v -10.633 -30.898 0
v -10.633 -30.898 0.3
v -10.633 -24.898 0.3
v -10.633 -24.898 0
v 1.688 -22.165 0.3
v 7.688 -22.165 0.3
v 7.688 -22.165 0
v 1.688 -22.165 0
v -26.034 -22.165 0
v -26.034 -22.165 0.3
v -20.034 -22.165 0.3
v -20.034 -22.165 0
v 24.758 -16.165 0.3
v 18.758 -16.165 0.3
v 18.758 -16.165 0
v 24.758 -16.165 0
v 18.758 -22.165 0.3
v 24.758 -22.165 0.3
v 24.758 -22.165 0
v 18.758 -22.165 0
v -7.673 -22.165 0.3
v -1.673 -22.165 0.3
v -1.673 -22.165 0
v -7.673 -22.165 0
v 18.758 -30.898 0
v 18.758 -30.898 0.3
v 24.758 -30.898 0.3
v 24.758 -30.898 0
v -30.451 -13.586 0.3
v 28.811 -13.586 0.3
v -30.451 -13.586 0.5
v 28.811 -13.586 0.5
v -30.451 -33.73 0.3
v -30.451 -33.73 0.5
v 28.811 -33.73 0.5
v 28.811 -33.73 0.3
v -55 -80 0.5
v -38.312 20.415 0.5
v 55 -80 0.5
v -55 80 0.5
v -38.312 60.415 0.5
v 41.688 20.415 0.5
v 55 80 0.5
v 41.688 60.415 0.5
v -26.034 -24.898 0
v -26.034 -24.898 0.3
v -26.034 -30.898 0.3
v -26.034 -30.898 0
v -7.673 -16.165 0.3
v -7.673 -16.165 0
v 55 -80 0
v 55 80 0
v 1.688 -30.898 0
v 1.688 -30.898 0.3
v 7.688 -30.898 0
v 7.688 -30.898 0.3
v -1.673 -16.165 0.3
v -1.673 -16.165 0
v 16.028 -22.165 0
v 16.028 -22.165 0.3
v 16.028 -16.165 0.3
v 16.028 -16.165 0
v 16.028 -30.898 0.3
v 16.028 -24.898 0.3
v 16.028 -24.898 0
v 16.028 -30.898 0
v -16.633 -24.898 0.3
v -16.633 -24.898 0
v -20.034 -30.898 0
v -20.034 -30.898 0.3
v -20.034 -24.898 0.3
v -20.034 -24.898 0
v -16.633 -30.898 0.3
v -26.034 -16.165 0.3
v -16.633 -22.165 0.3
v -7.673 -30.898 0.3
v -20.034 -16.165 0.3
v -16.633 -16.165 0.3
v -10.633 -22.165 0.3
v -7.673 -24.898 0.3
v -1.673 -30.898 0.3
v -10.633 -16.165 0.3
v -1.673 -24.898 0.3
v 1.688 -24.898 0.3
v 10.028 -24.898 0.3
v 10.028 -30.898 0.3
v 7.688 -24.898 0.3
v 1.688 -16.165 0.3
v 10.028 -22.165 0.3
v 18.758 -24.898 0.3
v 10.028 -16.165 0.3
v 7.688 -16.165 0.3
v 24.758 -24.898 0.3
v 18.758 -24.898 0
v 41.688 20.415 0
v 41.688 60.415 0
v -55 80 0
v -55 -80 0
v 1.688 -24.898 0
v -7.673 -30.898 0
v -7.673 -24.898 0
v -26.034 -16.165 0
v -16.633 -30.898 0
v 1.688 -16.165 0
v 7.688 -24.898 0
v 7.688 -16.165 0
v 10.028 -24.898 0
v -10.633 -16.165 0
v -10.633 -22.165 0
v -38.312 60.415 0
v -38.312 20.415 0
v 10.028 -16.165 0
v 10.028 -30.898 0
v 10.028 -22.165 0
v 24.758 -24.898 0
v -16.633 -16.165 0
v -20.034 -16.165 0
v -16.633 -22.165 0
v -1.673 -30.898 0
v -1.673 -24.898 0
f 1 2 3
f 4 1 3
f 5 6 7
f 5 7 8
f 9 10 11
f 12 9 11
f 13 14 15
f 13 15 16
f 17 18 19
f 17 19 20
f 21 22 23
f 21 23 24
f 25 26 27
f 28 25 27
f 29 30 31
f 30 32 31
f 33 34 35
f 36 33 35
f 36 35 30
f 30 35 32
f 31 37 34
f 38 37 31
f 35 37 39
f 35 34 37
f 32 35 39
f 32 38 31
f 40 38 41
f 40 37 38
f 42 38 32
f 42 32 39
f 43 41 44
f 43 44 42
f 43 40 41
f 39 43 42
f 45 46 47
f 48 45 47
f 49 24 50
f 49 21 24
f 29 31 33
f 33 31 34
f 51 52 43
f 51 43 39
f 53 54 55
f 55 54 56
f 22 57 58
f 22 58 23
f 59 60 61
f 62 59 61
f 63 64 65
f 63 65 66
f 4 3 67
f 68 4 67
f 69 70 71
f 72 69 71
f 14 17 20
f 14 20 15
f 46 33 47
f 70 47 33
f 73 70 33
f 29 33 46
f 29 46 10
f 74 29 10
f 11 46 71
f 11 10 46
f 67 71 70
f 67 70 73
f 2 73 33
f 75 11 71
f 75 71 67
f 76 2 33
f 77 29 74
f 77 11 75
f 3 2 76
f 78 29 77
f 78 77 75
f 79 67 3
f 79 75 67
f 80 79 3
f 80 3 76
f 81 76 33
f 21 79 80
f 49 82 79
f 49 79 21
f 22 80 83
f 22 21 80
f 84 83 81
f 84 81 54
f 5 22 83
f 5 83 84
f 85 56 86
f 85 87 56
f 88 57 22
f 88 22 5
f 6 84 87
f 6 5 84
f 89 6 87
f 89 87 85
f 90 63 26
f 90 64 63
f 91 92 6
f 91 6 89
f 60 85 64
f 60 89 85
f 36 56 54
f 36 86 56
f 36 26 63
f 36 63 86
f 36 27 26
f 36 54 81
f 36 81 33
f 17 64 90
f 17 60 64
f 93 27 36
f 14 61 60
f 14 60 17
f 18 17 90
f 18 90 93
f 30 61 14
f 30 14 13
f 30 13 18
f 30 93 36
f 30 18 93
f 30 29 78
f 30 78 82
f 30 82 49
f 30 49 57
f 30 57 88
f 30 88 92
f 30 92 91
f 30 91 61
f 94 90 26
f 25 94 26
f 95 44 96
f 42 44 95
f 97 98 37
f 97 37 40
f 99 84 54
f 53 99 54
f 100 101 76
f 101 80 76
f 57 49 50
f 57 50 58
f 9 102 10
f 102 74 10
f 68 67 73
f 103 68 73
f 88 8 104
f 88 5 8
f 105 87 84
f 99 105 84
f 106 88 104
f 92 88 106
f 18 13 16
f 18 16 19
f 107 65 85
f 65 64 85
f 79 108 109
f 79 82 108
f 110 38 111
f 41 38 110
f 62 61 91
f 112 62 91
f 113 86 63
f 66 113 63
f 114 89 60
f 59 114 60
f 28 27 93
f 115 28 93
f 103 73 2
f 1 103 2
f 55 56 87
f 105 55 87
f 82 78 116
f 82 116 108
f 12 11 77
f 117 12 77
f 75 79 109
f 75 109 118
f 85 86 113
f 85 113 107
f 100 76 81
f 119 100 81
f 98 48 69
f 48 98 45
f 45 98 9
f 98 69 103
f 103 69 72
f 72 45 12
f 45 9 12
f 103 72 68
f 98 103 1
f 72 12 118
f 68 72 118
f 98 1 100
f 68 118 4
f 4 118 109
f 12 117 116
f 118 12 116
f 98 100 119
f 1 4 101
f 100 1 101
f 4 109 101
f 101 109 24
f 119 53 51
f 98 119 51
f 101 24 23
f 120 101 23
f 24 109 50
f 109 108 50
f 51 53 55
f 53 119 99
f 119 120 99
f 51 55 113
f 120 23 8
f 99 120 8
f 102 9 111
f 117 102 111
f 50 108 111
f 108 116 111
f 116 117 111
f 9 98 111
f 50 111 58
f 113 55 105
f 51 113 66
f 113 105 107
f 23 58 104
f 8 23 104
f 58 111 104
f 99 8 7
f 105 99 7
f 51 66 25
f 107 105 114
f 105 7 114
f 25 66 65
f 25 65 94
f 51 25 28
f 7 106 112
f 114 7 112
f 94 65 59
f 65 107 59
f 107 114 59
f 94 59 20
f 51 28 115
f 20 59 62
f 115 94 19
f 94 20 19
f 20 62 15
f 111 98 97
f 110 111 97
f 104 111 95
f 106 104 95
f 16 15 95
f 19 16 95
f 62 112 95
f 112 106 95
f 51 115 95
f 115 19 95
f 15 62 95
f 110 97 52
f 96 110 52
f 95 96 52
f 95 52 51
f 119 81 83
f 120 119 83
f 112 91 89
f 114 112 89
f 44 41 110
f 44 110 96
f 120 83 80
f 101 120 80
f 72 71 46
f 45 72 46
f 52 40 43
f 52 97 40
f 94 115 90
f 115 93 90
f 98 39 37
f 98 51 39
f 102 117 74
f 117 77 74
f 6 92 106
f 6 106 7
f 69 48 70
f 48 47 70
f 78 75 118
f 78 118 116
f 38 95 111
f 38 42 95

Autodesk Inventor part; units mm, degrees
ref_plane "YZ Plane" through (0, 0, 0) normal (1, 0, 0) x (0, 1, 0)
ref_plane "XZ Plane" through (0, 0, 0) normal (0, 1, 0) x (-1, 0, 0)
ref_plane "XY Plane" through (0, 0, 0) normal (0, 0, 1) x (1, 0, 0)
sketch "Boceto1" plane through (0, 0, 0) normal (0, 0, 1) x (1, 0, 0)
  line L0 (-55, 80) -> (55, 80)
  line L1 (55, 80) -> (55, -80)
  line L2 (55, -80) -> (-55, -80)
  line L3 (-55, -80) -> (-55, 80)
  line L4 (-55, 80) -> (55, -80) construction
  line L5 (55, 80) -> (-55, -80) construction
  point P0 (0, 0)
  dimension "d0" = 110
  dimension "d1" = 160
extrude "Placa1" add sketch "Boceto1" along normal blind 0.5
sketch "Boceto2" plane through (0, 0, 0.5) normal (0, 0, 1) x (1, 0, 0)
  line L0 (-38.3122, 60.4154) -> (41.6878, 60.4154)
  line L1 (41.6878, 60.4154) -> (41.6878, 20.4154)
  line L2 (41.6878, 20.4154) -> (-38.3122, 20.4154)
  line L3 (-38.3122, 20.4154) -> (-38.3122, 60.4154)
  line L4 (-26.0335, -16.1653) -> (-26.0335, -22.1653)
  line L5 (-26.0335, -22.1653) -> (-20.0335, -22.1653)
  line L6 (-20.0335, -22.1653) -> (-20.0335, -16.1653)
  line L7 (-20.0335, -16.1653) -> (-26.0335, -16.1653)
  line L8 (-16.6334, -22.1653) -> (-16.6334, -16.1653)
  line L9 (-16.6334, -16.1653) -> (-10.6334, -16.1653)
  line L10 (-10.6334, -16.1653) -> (-10.6334, -22.1653)
  line L11 (-10.6334, -22.1653) -> (-16.6334, -22.1653)
  line L12 (-7.6728, -22.1653) -> (-7.6728, -16.1653)
  line L13 (-7.6728, -16.1653) -> (-1.6728, -16.1653)
  line L14 (-1.6728, -16.1653) -> (-1.6728, -22.1653)
  line L15 (-1.6728, -22.1653) -> (-7.6728, -22.1653)
  line L16 (1.6878, -22.1653) -> (1.6878, -16.1653)
  line L17 (1.6878, -16.1653) -> (7.6878, -16.1653)
  line L18 (7.6878, -16.1653) -> (7.6878, -22.1653)
  line L19 (7.6878, -22.1653) -> (1.6878, -22.1653)
  line L20 (10.0278, -16.1653) -> (10.0278, -22.1653)
  line L21 (10.0278, -22.1653) -> (16.0278, -22.1653)
  line L22 (16.0278, -22.1653) -> (16.0278, -16.1653)
  line L23 (16.0278, -16.1653) -> (10.0278, -16.1653)
  line L24 (18.758, -22.1653) -> (18.758, -16.1653)
  line L25 (18.758, -16.1653) -> (24.758, -16.1653)
  line L26 (24.758, -16.1653) -> (24.758, -22.1653)
  line L27 (24.758, -22.1653) -> (18.758, -22.1653)
  line L28 (-26.0335, -24.8985) -> (-26.0335, -30.8985)
  line L29 (-26.0335, -30.8985) -> (-20.0335, -30.8985)
  line L30 (-20.0335, -30.8985) -> (-20.0335, -24.8985)
  line L31 (-20.0335, -24.8985) -> (-26.0335, -24.8985)
  line L32 (-16.6334, -24.8985) -> (-16.6334, -30.8985)
  line L33 (-16.6334, -30.8985) -> (-10.6334, -30.8985)
  line L34 (-10.6334, -30.8985) -> (-10.6334, -24.8985)
  line L35 (-10.6334, -24.8985) -> (-16.6334, -24.8985)
  line L36 (-7.6728, -24.8985) -> (-7.6728, -30.8985)
  line L37 (-7.6728, -30.8985) -> (-1.6728, -30.8985)
  line L38 (-1.6728, -30.8985) -> (-1.6728, -24.8985)
  line L39 (-1.6728, -24.8985) -> (-7.6728, -24.8985)
  line L40 (1.6878, -24.8985) -> (1.6878, -30.8985)
  line L41 (1.6878, -30.8985) -> (7.6878, -30.8985)
  line L42 (7.6878, -30.8985) -> (7.6878, -24.8985)
  line L43 (7.6878, -24.8985) -> (1.6878, -24.8985)
  line L44 (16.0278, -24.8985) -> (16.0278, -30.8985)
  line L45 (10.0278, -30.8985) -> (10.0278, -24.8985)
  line L46 (16.0278, -24.8985) -> (10.0278, -24.8985)
  line L47 (10.0278, -30.8985) -> (16.0278, -30.8985)
  line L48 (18.758, -24.8985) -> (18.758, -30.8985)
  line L49 (18.758, -30.8985) -> (24.758, -30.8985)
  line L50 (24.758, -30.8985) -> (24.758, -24.8985)
  line L51 (24.758, -24.8985) -> (18.758, -24.8985)
  point P0 (0, 0)
extrude "Extrusión1" cut sketch "Boceto2" against normal blind 10
sketch "Boceto3" plane through (0, 0, 0.5) normal (0, 0, 1) x (1, 0, 0)
  line L0 (-30.451, -13.5858) -> (-30.451, -33.7304)
  line L1 (-30.451, -33.7304) -> (28.8113, -33.7304)
  line L2 (28.8113, -33.7304) -> (28.8113, -13.5858)
  line L3 (28.8113, -13.5858) -> (-30.451, -13.5858)
  point P0 (0, 0)
extrude "Extrusión2" cut sketch "Boceto3" against normal blind 0.2
equation "\"d2\" = Grosor"
equation "\"Radio_pliegue\" = Grosor"
equation "\"Anchura_desahogo_plegado\" = Grosor"
equation "\"Profundidad_desahogo_plegado\" = 0.5 * Grosor"
equation "\"Tamaño_destalonado\" = 4 * Grosor"
equation "\"Remanente_mínimo\" = 2 * Grosor"
equation "\"Radiodetransición\" = Radio_pliegue"
equation "\"Tamaño_de_radio_de_Jacobi\" = Radio_pliegue"
equation "\"TamañoSeparación\" = Grosor"
equation "\"Grosor\" = 0.5"
properties material "Plástico LCP"
